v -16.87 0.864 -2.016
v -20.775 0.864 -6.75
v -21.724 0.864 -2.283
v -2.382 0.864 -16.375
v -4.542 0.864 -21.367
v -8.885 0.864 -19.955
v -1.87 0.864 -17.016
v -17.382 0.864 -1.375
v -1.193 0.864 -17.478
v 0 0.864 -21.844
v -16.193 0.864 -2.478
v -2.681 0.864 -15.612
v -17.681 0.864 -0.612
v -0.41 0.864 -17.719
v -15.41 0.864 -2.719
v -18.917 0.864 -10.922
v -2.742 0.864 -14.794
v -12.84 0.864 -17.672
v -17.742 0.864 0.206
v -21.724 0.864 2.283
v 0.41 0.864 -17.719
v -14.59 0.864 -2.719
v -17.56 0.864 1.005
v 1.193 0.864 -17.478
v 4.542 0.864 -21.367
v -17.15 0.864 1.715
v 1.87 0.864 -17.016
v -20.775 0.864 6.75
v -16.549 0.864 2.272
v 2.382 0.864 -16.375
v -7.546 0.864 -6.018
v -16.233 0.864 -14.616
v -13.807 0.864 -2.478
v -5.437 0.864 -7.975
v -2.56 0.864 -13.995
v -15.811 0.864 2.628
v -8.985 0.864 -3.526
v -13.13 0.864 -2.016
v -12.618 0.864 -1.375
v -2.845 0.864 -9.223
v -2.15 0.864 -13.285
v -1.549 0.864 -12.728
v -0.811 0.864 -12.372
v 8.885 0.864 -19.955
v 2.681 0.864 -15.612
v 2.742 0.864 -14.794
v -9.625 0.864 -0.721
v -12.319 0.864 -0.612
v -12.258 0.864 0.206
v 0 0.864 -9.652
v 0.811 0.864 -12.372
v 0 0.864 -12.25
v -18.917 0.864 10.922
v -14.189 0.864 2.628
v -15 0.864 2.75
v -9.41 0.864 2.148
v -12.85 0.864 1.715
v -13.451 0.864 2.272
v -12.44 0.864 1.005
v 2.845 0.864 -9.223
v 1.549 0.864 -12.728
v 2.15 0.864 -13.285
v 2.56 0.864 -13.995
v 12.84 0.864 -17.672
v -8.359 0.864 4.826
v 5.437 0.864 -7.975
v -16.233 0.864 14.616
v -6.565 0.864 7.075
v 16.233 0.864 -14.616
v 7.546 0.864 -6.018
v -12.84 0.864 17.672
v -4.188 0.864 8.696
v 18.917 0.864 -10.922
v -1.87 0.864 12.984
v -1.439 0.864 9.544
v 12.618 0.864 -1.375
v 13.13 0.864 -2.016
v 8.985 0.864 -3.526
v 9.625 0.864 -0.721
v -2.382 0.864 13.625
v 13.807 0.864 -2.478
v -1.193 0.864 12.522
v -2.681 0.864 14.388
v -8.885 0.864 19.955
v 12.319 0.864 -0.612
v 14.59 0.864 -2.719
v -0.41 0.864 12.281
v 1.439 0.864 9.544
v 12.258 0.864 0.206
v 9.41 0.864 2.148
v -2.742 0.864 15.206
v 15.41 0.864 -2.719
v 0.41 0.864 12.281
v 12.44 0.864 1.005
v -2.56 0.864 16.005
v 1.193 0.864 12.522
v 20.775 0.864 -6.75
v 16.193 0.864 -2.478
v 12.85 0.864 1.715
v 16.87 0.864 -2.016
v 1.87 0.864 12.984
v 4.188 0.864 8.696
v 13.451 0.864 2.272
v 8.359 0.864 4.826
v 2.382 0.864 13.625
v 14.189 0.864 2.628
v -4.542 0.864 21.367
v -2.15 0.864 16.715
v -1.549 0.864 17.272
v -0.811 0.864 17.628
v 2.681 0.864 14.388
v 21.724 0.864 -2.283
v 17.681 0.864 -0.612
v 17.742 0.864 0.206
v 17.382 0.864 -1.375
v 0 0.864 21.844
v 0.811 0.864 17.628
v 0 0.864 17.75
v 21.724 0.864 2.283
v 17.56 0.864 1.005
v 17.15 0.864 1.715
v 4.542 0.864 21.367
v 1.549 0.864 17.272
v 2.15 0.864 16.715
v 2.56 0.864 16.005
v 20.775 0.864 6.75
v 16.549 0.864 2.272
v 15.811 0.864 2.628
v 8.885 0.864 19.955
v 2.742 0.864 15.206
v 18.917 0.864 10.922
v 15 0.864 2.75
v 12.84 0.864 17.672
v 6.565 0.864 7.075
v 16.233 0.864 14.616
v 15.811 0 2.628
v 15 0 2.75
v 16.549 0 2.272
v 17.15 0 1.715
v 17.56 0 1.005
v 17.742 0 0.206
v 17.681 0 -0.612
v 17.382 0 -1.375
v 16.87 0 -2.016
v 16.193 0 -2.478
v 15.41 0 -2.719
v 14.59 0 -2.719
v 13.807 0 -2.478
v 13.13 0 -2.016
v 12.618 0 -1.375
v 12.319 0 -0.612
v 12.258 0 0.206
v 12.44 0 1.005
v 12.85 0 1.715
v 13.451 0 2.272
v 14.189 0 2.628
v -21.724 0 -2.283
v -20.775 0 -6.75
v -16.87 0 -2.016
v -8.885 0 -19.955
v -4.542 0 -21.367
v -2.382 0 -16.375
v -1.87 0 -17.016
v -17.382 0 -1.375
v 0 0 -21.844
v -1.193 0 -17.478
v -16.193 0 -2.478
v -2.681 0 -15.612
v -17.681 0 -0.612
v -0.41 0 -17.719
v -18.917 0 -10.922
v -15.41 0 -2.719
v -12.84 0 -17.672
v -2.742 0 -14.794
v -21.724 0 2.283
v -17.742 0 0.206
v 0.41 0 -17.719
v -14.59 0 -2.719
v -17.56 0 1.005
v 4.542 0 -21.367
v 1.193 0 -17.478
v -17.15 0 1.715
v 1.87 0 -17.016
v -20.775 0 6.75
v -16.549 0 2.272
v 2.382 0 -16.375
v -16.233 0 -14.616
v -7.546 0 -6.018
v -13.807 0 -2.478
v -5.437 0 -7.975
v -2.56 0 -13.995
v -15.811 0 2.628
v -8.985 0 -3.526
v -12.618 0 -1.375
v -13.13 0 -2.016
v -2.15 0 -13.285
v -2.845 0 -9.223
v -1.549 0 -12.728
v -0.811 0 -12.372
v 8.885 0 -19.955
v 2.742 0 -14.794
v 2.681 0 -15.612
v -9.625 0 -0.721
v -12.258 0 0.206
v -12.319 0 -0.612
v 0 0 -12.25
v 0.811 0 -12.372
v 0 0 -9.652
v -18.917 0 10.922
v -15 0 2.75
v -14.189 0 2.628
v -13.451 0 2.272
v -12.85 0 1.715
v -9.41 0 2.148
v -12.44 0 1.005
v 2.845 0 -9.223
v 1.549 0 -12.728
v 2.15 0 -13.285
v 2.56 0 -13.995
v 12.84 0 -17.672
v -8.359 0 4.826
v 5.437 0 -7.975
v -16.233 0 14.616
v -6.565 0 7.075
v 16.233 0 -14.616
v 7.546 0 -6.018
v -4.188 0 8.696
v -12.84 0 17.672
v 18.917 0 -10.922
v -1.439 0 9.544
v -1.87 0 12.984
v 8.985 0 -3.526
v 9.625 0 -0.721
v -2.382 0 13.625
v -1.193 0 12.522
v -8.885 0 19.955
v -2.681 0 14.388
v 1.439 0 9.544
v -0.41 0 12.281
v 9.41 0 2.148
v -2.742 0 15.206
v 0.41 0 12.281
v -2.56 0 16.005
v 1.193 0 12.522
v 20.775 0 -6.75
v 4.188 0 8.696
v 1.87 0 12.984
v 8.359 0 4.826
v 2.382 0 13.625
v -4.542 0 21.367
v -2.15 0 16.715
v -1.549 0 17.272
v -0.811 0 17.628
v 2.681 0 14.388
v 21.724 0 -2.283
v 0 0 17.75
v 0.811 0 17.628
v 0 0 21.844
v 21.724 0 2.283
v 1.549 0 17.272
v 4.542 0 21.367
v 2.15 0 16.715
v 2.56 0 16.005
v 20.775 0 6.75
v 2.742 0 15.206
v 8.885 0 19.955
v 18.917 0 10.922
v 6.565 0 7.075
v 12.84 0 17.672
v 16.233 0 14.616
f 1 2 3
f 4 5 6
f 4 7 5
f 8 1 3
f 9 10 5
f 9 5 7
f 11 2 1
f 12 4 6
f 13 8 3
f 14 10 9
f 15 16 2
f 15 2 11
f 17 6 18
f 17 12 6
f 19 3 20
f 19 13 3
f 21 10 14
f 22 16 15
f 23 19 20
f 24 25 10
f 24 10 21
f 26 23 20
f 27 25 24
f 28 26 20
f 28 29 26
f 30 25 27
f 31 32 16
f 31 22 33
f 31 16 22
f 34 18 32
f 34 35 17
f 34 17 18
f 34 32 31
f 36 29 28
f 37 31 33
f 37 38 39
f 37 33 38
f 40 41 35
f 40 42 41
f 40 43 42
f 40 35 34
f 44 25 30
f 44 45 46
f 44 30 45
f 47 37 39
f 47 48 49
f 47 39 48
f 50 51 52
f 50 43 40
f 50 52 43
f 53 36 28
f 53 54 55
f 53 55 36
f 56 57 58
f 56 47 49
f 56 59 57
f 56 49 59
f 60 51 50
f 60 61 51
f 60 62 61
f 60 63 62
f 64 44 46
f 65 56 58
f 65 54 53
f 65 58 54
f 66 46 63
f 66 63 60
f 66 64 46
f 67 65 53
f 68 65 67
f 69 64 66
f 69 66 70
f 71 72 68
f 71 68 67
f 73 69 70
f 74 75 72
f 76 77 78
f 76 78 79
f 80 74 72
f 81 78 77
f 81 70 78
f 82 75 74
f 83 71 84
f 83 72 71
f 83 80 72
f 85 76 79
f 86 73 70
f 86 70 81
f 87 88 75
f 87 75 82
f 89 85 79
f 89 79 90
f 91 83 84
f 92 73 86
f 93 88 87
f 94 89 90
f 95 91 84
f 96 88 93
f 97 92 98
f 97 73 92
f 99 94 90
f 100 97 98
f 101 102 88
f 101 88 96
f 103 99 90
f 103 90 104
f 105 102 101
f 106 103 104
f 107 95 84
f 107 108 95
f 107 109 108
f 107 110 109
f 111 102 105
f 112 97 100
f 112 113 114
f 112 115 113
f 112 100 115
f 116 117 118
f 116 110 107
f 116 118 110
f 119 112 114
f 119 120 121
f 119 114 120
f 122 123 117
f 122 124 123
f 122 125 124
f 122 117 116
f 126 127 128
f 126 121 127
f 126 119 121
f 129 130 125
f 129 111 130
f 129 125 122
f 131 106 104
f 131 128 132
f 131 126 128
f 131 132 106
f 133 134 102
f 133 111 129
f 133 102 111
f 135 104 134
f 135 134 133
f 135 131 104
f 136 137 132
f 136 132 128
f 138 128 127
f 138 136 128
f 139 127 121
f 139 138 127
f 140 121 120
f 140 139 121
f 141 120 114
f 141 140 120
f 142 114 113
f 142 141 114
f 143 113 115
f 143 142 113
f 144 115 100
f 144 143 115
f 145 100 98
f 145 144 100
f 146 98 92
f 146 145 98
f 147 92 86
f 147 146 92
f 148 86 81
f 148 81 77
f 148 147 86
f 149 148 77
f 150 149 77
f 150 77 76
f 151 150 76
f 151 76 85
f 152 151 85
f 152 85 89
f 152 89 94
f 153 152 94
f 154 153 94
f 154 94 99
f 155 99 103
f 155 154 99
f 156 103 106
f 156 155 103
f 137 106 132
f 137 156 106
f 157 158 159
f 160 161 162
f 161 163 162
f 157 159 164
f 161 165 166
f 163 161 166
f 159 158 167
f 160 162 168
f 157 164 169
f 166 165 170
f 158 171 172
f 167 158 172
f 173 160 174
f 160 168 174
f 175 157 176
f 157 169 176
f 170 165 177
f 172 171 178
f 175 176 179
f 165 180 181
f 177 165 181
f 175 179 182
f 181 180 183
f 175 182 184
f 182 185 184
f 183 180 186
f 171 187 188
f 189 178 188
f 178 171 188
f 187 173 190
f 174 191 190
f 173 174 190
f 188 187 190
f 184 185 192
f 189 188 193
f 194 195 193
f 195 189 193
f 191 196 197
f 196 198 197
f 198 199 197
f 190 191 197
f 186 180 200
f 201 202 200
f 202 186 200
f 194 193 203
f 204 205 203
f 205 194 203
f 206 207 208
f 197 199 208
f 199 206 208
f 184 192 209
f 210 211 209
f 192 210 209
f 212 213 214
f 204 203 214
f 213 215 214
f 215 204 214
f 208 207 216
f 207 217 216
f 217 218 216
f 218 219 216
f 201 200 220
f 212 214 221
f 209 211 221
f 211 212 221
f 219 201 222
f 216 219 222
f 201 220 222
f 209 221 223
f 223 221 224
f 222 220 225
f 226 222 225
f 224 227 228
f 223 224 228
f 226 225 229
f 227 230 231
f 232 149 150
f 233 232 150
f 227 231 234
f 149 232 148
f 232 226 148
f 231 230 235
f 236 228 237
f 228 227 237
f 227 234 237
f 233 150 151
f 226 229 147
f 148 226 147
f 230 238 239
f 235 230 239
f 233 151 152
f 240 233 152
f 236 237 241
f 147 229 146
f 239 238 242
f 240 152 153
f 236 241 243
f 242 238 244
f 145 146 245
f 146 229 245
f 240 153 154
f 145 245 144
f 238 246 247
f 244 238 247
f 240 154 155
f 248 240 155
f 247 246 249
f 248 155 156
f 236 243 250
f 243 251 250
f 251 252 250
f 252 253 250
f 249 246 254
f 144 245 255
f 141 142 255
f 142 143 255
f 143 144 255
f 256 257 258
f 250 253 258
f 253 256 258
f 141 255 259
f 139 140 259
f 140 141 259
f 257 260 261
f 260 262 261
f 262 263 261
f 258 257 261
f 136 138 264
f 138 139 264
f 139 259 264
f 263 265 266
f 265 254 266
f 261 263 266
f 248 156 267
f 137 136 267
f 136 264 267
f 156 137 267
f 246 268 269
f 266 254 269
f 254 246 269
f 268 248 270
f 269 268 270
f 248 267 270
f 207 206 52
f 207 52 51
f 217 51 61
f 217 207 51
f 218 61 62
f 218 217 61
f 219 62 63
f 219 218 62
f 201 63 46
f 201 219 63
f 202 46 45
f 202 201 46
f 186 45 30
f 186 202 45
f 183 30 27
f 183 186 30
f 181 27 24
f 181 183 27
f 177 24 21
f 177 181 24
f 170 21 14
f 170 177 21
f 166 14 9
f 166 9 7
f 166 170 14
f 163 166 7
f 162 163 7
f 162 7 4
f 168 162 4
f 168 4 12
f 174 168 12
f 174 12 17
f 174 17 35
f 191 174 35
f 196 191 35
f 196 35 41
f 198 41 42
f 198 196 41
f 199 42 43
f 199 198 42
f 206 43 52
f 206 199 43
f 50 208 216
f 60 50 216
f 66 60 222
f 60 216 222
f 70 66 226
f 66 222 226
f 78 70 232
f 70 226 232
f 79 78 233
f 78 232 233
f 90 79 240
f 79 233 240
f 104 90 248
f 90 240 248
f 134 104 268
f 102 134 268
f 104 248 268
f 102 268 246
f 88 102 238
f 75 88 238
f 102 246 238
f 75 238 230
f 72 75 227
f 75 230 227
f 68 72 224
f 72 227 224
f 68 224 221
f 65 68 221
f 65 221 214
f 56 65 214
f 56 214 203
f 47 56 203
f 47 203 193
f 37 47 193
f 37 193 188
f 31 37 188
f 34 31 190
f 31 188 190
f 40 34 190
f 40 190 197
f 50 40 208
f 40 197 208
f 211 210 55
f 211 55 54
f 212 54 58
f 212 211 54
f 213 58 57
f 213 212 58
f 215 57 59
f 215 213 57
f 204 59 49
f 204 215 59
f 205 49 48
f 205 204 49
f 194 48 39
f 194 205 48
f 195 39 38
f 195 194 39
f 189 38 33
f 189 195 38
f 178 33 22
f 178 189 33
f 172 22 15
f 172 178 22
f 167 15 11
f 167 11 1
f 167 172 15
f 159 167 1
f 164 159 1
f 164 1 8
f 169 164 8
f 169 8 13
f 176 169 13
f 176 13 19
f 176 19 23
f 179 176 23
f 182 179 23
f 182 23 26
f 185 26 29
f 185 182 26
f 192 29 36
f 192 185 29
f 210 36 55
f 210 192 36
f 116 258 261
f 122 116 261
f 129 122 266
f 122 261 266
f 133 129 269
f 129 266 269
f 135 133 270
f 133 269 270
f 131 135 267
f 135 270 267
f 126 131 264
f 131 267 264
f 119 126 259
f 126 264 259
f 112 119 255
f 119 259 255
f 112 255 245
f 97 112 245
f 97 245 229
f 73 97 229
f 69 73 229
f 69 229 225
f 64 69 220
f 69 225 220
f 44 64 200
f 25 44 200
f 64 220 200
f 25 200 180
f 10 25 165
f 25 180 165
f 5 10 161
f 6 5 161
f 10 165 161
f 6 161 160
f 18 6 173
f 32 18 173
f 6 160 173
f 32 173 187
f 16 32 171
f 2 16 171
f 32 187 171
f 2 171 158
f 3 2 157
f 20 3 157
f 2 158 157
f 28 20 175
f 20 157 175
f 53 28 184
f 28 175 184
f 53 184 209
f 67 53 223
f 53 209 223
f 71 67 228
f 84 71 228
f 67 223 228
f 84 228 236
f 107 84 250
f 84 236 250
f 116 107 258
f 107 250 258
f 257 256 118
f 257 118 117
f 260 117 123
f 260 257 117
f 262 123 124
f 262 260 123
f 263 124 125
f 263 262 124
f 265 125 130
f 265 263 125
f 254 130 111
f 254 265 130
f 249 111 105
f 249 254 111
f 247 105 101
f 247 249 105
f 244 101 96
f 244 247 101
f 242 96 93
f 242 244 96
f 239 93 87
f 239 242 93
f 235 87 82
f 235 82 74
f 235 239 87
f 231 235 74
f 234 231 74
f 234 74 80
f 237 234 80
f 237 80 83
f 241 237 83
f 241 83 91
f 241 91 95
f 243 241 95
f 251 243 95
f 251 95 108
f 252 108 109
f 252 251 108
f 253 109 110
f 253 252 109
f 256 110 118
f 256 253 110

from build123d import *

# Parameters (mm, degrees)
SKETCH1_R           = 21.844
SKETCH1_R_2         = 2.75
BOSS_EXTRUDE1_DEPTH = 0.8636
SKETCH2_R           = 9.652
CUT_EXTRUDE1_DEPTH  = 0.8636


with BuildPart() as part:
    # Sketch1 → Boss-Extrude1 (new body)
    with BuildSketch(Plane(origin=(0, 0, 0), x_dir=(1, 0, 0), z_dir=(0, 1, 0))):
        with Locations(Location((0, 0, 0), (0, 0, 270))):
            Circle(SKETCH1_R)
        with Locations(Location((0, 15, 0), (0, 0, 270))):
            Circle(SKETCH1_R_2, mode=Mode.SUBTRACT)
        with Locations(Location((15, 0, 0), (0, 0, 270))):
            Circle(SKETCH1_R_2, mode=Mode.SUBTRACT)
        with Locations(Location((0, -15, 0), (0, 0, 270))):
            Circle(SKETCH1_R_2, mode=Mode.SUBTRACT)
        with Locations(Location((-15, 0, 0), (0, 0, 270))):
            Circle(SKETCH1_R_2, mode=Mode.SUBTRACT)
    extrude(amount=BOSS_EXTRUDE1_DEPTH)

    # Sketch2 → Cut-Extrude1 (cut)
    with BuildSketch(Plane.XZ):
        with Locations(Location((0, 0, 0), (0, 0, 270))):
            Circle(SKETCH2_R)
    extrude(amount=-CUT_EXTRUDE1_DEPTH, mode=Mode.SUBTRACT)


solid = part.part
